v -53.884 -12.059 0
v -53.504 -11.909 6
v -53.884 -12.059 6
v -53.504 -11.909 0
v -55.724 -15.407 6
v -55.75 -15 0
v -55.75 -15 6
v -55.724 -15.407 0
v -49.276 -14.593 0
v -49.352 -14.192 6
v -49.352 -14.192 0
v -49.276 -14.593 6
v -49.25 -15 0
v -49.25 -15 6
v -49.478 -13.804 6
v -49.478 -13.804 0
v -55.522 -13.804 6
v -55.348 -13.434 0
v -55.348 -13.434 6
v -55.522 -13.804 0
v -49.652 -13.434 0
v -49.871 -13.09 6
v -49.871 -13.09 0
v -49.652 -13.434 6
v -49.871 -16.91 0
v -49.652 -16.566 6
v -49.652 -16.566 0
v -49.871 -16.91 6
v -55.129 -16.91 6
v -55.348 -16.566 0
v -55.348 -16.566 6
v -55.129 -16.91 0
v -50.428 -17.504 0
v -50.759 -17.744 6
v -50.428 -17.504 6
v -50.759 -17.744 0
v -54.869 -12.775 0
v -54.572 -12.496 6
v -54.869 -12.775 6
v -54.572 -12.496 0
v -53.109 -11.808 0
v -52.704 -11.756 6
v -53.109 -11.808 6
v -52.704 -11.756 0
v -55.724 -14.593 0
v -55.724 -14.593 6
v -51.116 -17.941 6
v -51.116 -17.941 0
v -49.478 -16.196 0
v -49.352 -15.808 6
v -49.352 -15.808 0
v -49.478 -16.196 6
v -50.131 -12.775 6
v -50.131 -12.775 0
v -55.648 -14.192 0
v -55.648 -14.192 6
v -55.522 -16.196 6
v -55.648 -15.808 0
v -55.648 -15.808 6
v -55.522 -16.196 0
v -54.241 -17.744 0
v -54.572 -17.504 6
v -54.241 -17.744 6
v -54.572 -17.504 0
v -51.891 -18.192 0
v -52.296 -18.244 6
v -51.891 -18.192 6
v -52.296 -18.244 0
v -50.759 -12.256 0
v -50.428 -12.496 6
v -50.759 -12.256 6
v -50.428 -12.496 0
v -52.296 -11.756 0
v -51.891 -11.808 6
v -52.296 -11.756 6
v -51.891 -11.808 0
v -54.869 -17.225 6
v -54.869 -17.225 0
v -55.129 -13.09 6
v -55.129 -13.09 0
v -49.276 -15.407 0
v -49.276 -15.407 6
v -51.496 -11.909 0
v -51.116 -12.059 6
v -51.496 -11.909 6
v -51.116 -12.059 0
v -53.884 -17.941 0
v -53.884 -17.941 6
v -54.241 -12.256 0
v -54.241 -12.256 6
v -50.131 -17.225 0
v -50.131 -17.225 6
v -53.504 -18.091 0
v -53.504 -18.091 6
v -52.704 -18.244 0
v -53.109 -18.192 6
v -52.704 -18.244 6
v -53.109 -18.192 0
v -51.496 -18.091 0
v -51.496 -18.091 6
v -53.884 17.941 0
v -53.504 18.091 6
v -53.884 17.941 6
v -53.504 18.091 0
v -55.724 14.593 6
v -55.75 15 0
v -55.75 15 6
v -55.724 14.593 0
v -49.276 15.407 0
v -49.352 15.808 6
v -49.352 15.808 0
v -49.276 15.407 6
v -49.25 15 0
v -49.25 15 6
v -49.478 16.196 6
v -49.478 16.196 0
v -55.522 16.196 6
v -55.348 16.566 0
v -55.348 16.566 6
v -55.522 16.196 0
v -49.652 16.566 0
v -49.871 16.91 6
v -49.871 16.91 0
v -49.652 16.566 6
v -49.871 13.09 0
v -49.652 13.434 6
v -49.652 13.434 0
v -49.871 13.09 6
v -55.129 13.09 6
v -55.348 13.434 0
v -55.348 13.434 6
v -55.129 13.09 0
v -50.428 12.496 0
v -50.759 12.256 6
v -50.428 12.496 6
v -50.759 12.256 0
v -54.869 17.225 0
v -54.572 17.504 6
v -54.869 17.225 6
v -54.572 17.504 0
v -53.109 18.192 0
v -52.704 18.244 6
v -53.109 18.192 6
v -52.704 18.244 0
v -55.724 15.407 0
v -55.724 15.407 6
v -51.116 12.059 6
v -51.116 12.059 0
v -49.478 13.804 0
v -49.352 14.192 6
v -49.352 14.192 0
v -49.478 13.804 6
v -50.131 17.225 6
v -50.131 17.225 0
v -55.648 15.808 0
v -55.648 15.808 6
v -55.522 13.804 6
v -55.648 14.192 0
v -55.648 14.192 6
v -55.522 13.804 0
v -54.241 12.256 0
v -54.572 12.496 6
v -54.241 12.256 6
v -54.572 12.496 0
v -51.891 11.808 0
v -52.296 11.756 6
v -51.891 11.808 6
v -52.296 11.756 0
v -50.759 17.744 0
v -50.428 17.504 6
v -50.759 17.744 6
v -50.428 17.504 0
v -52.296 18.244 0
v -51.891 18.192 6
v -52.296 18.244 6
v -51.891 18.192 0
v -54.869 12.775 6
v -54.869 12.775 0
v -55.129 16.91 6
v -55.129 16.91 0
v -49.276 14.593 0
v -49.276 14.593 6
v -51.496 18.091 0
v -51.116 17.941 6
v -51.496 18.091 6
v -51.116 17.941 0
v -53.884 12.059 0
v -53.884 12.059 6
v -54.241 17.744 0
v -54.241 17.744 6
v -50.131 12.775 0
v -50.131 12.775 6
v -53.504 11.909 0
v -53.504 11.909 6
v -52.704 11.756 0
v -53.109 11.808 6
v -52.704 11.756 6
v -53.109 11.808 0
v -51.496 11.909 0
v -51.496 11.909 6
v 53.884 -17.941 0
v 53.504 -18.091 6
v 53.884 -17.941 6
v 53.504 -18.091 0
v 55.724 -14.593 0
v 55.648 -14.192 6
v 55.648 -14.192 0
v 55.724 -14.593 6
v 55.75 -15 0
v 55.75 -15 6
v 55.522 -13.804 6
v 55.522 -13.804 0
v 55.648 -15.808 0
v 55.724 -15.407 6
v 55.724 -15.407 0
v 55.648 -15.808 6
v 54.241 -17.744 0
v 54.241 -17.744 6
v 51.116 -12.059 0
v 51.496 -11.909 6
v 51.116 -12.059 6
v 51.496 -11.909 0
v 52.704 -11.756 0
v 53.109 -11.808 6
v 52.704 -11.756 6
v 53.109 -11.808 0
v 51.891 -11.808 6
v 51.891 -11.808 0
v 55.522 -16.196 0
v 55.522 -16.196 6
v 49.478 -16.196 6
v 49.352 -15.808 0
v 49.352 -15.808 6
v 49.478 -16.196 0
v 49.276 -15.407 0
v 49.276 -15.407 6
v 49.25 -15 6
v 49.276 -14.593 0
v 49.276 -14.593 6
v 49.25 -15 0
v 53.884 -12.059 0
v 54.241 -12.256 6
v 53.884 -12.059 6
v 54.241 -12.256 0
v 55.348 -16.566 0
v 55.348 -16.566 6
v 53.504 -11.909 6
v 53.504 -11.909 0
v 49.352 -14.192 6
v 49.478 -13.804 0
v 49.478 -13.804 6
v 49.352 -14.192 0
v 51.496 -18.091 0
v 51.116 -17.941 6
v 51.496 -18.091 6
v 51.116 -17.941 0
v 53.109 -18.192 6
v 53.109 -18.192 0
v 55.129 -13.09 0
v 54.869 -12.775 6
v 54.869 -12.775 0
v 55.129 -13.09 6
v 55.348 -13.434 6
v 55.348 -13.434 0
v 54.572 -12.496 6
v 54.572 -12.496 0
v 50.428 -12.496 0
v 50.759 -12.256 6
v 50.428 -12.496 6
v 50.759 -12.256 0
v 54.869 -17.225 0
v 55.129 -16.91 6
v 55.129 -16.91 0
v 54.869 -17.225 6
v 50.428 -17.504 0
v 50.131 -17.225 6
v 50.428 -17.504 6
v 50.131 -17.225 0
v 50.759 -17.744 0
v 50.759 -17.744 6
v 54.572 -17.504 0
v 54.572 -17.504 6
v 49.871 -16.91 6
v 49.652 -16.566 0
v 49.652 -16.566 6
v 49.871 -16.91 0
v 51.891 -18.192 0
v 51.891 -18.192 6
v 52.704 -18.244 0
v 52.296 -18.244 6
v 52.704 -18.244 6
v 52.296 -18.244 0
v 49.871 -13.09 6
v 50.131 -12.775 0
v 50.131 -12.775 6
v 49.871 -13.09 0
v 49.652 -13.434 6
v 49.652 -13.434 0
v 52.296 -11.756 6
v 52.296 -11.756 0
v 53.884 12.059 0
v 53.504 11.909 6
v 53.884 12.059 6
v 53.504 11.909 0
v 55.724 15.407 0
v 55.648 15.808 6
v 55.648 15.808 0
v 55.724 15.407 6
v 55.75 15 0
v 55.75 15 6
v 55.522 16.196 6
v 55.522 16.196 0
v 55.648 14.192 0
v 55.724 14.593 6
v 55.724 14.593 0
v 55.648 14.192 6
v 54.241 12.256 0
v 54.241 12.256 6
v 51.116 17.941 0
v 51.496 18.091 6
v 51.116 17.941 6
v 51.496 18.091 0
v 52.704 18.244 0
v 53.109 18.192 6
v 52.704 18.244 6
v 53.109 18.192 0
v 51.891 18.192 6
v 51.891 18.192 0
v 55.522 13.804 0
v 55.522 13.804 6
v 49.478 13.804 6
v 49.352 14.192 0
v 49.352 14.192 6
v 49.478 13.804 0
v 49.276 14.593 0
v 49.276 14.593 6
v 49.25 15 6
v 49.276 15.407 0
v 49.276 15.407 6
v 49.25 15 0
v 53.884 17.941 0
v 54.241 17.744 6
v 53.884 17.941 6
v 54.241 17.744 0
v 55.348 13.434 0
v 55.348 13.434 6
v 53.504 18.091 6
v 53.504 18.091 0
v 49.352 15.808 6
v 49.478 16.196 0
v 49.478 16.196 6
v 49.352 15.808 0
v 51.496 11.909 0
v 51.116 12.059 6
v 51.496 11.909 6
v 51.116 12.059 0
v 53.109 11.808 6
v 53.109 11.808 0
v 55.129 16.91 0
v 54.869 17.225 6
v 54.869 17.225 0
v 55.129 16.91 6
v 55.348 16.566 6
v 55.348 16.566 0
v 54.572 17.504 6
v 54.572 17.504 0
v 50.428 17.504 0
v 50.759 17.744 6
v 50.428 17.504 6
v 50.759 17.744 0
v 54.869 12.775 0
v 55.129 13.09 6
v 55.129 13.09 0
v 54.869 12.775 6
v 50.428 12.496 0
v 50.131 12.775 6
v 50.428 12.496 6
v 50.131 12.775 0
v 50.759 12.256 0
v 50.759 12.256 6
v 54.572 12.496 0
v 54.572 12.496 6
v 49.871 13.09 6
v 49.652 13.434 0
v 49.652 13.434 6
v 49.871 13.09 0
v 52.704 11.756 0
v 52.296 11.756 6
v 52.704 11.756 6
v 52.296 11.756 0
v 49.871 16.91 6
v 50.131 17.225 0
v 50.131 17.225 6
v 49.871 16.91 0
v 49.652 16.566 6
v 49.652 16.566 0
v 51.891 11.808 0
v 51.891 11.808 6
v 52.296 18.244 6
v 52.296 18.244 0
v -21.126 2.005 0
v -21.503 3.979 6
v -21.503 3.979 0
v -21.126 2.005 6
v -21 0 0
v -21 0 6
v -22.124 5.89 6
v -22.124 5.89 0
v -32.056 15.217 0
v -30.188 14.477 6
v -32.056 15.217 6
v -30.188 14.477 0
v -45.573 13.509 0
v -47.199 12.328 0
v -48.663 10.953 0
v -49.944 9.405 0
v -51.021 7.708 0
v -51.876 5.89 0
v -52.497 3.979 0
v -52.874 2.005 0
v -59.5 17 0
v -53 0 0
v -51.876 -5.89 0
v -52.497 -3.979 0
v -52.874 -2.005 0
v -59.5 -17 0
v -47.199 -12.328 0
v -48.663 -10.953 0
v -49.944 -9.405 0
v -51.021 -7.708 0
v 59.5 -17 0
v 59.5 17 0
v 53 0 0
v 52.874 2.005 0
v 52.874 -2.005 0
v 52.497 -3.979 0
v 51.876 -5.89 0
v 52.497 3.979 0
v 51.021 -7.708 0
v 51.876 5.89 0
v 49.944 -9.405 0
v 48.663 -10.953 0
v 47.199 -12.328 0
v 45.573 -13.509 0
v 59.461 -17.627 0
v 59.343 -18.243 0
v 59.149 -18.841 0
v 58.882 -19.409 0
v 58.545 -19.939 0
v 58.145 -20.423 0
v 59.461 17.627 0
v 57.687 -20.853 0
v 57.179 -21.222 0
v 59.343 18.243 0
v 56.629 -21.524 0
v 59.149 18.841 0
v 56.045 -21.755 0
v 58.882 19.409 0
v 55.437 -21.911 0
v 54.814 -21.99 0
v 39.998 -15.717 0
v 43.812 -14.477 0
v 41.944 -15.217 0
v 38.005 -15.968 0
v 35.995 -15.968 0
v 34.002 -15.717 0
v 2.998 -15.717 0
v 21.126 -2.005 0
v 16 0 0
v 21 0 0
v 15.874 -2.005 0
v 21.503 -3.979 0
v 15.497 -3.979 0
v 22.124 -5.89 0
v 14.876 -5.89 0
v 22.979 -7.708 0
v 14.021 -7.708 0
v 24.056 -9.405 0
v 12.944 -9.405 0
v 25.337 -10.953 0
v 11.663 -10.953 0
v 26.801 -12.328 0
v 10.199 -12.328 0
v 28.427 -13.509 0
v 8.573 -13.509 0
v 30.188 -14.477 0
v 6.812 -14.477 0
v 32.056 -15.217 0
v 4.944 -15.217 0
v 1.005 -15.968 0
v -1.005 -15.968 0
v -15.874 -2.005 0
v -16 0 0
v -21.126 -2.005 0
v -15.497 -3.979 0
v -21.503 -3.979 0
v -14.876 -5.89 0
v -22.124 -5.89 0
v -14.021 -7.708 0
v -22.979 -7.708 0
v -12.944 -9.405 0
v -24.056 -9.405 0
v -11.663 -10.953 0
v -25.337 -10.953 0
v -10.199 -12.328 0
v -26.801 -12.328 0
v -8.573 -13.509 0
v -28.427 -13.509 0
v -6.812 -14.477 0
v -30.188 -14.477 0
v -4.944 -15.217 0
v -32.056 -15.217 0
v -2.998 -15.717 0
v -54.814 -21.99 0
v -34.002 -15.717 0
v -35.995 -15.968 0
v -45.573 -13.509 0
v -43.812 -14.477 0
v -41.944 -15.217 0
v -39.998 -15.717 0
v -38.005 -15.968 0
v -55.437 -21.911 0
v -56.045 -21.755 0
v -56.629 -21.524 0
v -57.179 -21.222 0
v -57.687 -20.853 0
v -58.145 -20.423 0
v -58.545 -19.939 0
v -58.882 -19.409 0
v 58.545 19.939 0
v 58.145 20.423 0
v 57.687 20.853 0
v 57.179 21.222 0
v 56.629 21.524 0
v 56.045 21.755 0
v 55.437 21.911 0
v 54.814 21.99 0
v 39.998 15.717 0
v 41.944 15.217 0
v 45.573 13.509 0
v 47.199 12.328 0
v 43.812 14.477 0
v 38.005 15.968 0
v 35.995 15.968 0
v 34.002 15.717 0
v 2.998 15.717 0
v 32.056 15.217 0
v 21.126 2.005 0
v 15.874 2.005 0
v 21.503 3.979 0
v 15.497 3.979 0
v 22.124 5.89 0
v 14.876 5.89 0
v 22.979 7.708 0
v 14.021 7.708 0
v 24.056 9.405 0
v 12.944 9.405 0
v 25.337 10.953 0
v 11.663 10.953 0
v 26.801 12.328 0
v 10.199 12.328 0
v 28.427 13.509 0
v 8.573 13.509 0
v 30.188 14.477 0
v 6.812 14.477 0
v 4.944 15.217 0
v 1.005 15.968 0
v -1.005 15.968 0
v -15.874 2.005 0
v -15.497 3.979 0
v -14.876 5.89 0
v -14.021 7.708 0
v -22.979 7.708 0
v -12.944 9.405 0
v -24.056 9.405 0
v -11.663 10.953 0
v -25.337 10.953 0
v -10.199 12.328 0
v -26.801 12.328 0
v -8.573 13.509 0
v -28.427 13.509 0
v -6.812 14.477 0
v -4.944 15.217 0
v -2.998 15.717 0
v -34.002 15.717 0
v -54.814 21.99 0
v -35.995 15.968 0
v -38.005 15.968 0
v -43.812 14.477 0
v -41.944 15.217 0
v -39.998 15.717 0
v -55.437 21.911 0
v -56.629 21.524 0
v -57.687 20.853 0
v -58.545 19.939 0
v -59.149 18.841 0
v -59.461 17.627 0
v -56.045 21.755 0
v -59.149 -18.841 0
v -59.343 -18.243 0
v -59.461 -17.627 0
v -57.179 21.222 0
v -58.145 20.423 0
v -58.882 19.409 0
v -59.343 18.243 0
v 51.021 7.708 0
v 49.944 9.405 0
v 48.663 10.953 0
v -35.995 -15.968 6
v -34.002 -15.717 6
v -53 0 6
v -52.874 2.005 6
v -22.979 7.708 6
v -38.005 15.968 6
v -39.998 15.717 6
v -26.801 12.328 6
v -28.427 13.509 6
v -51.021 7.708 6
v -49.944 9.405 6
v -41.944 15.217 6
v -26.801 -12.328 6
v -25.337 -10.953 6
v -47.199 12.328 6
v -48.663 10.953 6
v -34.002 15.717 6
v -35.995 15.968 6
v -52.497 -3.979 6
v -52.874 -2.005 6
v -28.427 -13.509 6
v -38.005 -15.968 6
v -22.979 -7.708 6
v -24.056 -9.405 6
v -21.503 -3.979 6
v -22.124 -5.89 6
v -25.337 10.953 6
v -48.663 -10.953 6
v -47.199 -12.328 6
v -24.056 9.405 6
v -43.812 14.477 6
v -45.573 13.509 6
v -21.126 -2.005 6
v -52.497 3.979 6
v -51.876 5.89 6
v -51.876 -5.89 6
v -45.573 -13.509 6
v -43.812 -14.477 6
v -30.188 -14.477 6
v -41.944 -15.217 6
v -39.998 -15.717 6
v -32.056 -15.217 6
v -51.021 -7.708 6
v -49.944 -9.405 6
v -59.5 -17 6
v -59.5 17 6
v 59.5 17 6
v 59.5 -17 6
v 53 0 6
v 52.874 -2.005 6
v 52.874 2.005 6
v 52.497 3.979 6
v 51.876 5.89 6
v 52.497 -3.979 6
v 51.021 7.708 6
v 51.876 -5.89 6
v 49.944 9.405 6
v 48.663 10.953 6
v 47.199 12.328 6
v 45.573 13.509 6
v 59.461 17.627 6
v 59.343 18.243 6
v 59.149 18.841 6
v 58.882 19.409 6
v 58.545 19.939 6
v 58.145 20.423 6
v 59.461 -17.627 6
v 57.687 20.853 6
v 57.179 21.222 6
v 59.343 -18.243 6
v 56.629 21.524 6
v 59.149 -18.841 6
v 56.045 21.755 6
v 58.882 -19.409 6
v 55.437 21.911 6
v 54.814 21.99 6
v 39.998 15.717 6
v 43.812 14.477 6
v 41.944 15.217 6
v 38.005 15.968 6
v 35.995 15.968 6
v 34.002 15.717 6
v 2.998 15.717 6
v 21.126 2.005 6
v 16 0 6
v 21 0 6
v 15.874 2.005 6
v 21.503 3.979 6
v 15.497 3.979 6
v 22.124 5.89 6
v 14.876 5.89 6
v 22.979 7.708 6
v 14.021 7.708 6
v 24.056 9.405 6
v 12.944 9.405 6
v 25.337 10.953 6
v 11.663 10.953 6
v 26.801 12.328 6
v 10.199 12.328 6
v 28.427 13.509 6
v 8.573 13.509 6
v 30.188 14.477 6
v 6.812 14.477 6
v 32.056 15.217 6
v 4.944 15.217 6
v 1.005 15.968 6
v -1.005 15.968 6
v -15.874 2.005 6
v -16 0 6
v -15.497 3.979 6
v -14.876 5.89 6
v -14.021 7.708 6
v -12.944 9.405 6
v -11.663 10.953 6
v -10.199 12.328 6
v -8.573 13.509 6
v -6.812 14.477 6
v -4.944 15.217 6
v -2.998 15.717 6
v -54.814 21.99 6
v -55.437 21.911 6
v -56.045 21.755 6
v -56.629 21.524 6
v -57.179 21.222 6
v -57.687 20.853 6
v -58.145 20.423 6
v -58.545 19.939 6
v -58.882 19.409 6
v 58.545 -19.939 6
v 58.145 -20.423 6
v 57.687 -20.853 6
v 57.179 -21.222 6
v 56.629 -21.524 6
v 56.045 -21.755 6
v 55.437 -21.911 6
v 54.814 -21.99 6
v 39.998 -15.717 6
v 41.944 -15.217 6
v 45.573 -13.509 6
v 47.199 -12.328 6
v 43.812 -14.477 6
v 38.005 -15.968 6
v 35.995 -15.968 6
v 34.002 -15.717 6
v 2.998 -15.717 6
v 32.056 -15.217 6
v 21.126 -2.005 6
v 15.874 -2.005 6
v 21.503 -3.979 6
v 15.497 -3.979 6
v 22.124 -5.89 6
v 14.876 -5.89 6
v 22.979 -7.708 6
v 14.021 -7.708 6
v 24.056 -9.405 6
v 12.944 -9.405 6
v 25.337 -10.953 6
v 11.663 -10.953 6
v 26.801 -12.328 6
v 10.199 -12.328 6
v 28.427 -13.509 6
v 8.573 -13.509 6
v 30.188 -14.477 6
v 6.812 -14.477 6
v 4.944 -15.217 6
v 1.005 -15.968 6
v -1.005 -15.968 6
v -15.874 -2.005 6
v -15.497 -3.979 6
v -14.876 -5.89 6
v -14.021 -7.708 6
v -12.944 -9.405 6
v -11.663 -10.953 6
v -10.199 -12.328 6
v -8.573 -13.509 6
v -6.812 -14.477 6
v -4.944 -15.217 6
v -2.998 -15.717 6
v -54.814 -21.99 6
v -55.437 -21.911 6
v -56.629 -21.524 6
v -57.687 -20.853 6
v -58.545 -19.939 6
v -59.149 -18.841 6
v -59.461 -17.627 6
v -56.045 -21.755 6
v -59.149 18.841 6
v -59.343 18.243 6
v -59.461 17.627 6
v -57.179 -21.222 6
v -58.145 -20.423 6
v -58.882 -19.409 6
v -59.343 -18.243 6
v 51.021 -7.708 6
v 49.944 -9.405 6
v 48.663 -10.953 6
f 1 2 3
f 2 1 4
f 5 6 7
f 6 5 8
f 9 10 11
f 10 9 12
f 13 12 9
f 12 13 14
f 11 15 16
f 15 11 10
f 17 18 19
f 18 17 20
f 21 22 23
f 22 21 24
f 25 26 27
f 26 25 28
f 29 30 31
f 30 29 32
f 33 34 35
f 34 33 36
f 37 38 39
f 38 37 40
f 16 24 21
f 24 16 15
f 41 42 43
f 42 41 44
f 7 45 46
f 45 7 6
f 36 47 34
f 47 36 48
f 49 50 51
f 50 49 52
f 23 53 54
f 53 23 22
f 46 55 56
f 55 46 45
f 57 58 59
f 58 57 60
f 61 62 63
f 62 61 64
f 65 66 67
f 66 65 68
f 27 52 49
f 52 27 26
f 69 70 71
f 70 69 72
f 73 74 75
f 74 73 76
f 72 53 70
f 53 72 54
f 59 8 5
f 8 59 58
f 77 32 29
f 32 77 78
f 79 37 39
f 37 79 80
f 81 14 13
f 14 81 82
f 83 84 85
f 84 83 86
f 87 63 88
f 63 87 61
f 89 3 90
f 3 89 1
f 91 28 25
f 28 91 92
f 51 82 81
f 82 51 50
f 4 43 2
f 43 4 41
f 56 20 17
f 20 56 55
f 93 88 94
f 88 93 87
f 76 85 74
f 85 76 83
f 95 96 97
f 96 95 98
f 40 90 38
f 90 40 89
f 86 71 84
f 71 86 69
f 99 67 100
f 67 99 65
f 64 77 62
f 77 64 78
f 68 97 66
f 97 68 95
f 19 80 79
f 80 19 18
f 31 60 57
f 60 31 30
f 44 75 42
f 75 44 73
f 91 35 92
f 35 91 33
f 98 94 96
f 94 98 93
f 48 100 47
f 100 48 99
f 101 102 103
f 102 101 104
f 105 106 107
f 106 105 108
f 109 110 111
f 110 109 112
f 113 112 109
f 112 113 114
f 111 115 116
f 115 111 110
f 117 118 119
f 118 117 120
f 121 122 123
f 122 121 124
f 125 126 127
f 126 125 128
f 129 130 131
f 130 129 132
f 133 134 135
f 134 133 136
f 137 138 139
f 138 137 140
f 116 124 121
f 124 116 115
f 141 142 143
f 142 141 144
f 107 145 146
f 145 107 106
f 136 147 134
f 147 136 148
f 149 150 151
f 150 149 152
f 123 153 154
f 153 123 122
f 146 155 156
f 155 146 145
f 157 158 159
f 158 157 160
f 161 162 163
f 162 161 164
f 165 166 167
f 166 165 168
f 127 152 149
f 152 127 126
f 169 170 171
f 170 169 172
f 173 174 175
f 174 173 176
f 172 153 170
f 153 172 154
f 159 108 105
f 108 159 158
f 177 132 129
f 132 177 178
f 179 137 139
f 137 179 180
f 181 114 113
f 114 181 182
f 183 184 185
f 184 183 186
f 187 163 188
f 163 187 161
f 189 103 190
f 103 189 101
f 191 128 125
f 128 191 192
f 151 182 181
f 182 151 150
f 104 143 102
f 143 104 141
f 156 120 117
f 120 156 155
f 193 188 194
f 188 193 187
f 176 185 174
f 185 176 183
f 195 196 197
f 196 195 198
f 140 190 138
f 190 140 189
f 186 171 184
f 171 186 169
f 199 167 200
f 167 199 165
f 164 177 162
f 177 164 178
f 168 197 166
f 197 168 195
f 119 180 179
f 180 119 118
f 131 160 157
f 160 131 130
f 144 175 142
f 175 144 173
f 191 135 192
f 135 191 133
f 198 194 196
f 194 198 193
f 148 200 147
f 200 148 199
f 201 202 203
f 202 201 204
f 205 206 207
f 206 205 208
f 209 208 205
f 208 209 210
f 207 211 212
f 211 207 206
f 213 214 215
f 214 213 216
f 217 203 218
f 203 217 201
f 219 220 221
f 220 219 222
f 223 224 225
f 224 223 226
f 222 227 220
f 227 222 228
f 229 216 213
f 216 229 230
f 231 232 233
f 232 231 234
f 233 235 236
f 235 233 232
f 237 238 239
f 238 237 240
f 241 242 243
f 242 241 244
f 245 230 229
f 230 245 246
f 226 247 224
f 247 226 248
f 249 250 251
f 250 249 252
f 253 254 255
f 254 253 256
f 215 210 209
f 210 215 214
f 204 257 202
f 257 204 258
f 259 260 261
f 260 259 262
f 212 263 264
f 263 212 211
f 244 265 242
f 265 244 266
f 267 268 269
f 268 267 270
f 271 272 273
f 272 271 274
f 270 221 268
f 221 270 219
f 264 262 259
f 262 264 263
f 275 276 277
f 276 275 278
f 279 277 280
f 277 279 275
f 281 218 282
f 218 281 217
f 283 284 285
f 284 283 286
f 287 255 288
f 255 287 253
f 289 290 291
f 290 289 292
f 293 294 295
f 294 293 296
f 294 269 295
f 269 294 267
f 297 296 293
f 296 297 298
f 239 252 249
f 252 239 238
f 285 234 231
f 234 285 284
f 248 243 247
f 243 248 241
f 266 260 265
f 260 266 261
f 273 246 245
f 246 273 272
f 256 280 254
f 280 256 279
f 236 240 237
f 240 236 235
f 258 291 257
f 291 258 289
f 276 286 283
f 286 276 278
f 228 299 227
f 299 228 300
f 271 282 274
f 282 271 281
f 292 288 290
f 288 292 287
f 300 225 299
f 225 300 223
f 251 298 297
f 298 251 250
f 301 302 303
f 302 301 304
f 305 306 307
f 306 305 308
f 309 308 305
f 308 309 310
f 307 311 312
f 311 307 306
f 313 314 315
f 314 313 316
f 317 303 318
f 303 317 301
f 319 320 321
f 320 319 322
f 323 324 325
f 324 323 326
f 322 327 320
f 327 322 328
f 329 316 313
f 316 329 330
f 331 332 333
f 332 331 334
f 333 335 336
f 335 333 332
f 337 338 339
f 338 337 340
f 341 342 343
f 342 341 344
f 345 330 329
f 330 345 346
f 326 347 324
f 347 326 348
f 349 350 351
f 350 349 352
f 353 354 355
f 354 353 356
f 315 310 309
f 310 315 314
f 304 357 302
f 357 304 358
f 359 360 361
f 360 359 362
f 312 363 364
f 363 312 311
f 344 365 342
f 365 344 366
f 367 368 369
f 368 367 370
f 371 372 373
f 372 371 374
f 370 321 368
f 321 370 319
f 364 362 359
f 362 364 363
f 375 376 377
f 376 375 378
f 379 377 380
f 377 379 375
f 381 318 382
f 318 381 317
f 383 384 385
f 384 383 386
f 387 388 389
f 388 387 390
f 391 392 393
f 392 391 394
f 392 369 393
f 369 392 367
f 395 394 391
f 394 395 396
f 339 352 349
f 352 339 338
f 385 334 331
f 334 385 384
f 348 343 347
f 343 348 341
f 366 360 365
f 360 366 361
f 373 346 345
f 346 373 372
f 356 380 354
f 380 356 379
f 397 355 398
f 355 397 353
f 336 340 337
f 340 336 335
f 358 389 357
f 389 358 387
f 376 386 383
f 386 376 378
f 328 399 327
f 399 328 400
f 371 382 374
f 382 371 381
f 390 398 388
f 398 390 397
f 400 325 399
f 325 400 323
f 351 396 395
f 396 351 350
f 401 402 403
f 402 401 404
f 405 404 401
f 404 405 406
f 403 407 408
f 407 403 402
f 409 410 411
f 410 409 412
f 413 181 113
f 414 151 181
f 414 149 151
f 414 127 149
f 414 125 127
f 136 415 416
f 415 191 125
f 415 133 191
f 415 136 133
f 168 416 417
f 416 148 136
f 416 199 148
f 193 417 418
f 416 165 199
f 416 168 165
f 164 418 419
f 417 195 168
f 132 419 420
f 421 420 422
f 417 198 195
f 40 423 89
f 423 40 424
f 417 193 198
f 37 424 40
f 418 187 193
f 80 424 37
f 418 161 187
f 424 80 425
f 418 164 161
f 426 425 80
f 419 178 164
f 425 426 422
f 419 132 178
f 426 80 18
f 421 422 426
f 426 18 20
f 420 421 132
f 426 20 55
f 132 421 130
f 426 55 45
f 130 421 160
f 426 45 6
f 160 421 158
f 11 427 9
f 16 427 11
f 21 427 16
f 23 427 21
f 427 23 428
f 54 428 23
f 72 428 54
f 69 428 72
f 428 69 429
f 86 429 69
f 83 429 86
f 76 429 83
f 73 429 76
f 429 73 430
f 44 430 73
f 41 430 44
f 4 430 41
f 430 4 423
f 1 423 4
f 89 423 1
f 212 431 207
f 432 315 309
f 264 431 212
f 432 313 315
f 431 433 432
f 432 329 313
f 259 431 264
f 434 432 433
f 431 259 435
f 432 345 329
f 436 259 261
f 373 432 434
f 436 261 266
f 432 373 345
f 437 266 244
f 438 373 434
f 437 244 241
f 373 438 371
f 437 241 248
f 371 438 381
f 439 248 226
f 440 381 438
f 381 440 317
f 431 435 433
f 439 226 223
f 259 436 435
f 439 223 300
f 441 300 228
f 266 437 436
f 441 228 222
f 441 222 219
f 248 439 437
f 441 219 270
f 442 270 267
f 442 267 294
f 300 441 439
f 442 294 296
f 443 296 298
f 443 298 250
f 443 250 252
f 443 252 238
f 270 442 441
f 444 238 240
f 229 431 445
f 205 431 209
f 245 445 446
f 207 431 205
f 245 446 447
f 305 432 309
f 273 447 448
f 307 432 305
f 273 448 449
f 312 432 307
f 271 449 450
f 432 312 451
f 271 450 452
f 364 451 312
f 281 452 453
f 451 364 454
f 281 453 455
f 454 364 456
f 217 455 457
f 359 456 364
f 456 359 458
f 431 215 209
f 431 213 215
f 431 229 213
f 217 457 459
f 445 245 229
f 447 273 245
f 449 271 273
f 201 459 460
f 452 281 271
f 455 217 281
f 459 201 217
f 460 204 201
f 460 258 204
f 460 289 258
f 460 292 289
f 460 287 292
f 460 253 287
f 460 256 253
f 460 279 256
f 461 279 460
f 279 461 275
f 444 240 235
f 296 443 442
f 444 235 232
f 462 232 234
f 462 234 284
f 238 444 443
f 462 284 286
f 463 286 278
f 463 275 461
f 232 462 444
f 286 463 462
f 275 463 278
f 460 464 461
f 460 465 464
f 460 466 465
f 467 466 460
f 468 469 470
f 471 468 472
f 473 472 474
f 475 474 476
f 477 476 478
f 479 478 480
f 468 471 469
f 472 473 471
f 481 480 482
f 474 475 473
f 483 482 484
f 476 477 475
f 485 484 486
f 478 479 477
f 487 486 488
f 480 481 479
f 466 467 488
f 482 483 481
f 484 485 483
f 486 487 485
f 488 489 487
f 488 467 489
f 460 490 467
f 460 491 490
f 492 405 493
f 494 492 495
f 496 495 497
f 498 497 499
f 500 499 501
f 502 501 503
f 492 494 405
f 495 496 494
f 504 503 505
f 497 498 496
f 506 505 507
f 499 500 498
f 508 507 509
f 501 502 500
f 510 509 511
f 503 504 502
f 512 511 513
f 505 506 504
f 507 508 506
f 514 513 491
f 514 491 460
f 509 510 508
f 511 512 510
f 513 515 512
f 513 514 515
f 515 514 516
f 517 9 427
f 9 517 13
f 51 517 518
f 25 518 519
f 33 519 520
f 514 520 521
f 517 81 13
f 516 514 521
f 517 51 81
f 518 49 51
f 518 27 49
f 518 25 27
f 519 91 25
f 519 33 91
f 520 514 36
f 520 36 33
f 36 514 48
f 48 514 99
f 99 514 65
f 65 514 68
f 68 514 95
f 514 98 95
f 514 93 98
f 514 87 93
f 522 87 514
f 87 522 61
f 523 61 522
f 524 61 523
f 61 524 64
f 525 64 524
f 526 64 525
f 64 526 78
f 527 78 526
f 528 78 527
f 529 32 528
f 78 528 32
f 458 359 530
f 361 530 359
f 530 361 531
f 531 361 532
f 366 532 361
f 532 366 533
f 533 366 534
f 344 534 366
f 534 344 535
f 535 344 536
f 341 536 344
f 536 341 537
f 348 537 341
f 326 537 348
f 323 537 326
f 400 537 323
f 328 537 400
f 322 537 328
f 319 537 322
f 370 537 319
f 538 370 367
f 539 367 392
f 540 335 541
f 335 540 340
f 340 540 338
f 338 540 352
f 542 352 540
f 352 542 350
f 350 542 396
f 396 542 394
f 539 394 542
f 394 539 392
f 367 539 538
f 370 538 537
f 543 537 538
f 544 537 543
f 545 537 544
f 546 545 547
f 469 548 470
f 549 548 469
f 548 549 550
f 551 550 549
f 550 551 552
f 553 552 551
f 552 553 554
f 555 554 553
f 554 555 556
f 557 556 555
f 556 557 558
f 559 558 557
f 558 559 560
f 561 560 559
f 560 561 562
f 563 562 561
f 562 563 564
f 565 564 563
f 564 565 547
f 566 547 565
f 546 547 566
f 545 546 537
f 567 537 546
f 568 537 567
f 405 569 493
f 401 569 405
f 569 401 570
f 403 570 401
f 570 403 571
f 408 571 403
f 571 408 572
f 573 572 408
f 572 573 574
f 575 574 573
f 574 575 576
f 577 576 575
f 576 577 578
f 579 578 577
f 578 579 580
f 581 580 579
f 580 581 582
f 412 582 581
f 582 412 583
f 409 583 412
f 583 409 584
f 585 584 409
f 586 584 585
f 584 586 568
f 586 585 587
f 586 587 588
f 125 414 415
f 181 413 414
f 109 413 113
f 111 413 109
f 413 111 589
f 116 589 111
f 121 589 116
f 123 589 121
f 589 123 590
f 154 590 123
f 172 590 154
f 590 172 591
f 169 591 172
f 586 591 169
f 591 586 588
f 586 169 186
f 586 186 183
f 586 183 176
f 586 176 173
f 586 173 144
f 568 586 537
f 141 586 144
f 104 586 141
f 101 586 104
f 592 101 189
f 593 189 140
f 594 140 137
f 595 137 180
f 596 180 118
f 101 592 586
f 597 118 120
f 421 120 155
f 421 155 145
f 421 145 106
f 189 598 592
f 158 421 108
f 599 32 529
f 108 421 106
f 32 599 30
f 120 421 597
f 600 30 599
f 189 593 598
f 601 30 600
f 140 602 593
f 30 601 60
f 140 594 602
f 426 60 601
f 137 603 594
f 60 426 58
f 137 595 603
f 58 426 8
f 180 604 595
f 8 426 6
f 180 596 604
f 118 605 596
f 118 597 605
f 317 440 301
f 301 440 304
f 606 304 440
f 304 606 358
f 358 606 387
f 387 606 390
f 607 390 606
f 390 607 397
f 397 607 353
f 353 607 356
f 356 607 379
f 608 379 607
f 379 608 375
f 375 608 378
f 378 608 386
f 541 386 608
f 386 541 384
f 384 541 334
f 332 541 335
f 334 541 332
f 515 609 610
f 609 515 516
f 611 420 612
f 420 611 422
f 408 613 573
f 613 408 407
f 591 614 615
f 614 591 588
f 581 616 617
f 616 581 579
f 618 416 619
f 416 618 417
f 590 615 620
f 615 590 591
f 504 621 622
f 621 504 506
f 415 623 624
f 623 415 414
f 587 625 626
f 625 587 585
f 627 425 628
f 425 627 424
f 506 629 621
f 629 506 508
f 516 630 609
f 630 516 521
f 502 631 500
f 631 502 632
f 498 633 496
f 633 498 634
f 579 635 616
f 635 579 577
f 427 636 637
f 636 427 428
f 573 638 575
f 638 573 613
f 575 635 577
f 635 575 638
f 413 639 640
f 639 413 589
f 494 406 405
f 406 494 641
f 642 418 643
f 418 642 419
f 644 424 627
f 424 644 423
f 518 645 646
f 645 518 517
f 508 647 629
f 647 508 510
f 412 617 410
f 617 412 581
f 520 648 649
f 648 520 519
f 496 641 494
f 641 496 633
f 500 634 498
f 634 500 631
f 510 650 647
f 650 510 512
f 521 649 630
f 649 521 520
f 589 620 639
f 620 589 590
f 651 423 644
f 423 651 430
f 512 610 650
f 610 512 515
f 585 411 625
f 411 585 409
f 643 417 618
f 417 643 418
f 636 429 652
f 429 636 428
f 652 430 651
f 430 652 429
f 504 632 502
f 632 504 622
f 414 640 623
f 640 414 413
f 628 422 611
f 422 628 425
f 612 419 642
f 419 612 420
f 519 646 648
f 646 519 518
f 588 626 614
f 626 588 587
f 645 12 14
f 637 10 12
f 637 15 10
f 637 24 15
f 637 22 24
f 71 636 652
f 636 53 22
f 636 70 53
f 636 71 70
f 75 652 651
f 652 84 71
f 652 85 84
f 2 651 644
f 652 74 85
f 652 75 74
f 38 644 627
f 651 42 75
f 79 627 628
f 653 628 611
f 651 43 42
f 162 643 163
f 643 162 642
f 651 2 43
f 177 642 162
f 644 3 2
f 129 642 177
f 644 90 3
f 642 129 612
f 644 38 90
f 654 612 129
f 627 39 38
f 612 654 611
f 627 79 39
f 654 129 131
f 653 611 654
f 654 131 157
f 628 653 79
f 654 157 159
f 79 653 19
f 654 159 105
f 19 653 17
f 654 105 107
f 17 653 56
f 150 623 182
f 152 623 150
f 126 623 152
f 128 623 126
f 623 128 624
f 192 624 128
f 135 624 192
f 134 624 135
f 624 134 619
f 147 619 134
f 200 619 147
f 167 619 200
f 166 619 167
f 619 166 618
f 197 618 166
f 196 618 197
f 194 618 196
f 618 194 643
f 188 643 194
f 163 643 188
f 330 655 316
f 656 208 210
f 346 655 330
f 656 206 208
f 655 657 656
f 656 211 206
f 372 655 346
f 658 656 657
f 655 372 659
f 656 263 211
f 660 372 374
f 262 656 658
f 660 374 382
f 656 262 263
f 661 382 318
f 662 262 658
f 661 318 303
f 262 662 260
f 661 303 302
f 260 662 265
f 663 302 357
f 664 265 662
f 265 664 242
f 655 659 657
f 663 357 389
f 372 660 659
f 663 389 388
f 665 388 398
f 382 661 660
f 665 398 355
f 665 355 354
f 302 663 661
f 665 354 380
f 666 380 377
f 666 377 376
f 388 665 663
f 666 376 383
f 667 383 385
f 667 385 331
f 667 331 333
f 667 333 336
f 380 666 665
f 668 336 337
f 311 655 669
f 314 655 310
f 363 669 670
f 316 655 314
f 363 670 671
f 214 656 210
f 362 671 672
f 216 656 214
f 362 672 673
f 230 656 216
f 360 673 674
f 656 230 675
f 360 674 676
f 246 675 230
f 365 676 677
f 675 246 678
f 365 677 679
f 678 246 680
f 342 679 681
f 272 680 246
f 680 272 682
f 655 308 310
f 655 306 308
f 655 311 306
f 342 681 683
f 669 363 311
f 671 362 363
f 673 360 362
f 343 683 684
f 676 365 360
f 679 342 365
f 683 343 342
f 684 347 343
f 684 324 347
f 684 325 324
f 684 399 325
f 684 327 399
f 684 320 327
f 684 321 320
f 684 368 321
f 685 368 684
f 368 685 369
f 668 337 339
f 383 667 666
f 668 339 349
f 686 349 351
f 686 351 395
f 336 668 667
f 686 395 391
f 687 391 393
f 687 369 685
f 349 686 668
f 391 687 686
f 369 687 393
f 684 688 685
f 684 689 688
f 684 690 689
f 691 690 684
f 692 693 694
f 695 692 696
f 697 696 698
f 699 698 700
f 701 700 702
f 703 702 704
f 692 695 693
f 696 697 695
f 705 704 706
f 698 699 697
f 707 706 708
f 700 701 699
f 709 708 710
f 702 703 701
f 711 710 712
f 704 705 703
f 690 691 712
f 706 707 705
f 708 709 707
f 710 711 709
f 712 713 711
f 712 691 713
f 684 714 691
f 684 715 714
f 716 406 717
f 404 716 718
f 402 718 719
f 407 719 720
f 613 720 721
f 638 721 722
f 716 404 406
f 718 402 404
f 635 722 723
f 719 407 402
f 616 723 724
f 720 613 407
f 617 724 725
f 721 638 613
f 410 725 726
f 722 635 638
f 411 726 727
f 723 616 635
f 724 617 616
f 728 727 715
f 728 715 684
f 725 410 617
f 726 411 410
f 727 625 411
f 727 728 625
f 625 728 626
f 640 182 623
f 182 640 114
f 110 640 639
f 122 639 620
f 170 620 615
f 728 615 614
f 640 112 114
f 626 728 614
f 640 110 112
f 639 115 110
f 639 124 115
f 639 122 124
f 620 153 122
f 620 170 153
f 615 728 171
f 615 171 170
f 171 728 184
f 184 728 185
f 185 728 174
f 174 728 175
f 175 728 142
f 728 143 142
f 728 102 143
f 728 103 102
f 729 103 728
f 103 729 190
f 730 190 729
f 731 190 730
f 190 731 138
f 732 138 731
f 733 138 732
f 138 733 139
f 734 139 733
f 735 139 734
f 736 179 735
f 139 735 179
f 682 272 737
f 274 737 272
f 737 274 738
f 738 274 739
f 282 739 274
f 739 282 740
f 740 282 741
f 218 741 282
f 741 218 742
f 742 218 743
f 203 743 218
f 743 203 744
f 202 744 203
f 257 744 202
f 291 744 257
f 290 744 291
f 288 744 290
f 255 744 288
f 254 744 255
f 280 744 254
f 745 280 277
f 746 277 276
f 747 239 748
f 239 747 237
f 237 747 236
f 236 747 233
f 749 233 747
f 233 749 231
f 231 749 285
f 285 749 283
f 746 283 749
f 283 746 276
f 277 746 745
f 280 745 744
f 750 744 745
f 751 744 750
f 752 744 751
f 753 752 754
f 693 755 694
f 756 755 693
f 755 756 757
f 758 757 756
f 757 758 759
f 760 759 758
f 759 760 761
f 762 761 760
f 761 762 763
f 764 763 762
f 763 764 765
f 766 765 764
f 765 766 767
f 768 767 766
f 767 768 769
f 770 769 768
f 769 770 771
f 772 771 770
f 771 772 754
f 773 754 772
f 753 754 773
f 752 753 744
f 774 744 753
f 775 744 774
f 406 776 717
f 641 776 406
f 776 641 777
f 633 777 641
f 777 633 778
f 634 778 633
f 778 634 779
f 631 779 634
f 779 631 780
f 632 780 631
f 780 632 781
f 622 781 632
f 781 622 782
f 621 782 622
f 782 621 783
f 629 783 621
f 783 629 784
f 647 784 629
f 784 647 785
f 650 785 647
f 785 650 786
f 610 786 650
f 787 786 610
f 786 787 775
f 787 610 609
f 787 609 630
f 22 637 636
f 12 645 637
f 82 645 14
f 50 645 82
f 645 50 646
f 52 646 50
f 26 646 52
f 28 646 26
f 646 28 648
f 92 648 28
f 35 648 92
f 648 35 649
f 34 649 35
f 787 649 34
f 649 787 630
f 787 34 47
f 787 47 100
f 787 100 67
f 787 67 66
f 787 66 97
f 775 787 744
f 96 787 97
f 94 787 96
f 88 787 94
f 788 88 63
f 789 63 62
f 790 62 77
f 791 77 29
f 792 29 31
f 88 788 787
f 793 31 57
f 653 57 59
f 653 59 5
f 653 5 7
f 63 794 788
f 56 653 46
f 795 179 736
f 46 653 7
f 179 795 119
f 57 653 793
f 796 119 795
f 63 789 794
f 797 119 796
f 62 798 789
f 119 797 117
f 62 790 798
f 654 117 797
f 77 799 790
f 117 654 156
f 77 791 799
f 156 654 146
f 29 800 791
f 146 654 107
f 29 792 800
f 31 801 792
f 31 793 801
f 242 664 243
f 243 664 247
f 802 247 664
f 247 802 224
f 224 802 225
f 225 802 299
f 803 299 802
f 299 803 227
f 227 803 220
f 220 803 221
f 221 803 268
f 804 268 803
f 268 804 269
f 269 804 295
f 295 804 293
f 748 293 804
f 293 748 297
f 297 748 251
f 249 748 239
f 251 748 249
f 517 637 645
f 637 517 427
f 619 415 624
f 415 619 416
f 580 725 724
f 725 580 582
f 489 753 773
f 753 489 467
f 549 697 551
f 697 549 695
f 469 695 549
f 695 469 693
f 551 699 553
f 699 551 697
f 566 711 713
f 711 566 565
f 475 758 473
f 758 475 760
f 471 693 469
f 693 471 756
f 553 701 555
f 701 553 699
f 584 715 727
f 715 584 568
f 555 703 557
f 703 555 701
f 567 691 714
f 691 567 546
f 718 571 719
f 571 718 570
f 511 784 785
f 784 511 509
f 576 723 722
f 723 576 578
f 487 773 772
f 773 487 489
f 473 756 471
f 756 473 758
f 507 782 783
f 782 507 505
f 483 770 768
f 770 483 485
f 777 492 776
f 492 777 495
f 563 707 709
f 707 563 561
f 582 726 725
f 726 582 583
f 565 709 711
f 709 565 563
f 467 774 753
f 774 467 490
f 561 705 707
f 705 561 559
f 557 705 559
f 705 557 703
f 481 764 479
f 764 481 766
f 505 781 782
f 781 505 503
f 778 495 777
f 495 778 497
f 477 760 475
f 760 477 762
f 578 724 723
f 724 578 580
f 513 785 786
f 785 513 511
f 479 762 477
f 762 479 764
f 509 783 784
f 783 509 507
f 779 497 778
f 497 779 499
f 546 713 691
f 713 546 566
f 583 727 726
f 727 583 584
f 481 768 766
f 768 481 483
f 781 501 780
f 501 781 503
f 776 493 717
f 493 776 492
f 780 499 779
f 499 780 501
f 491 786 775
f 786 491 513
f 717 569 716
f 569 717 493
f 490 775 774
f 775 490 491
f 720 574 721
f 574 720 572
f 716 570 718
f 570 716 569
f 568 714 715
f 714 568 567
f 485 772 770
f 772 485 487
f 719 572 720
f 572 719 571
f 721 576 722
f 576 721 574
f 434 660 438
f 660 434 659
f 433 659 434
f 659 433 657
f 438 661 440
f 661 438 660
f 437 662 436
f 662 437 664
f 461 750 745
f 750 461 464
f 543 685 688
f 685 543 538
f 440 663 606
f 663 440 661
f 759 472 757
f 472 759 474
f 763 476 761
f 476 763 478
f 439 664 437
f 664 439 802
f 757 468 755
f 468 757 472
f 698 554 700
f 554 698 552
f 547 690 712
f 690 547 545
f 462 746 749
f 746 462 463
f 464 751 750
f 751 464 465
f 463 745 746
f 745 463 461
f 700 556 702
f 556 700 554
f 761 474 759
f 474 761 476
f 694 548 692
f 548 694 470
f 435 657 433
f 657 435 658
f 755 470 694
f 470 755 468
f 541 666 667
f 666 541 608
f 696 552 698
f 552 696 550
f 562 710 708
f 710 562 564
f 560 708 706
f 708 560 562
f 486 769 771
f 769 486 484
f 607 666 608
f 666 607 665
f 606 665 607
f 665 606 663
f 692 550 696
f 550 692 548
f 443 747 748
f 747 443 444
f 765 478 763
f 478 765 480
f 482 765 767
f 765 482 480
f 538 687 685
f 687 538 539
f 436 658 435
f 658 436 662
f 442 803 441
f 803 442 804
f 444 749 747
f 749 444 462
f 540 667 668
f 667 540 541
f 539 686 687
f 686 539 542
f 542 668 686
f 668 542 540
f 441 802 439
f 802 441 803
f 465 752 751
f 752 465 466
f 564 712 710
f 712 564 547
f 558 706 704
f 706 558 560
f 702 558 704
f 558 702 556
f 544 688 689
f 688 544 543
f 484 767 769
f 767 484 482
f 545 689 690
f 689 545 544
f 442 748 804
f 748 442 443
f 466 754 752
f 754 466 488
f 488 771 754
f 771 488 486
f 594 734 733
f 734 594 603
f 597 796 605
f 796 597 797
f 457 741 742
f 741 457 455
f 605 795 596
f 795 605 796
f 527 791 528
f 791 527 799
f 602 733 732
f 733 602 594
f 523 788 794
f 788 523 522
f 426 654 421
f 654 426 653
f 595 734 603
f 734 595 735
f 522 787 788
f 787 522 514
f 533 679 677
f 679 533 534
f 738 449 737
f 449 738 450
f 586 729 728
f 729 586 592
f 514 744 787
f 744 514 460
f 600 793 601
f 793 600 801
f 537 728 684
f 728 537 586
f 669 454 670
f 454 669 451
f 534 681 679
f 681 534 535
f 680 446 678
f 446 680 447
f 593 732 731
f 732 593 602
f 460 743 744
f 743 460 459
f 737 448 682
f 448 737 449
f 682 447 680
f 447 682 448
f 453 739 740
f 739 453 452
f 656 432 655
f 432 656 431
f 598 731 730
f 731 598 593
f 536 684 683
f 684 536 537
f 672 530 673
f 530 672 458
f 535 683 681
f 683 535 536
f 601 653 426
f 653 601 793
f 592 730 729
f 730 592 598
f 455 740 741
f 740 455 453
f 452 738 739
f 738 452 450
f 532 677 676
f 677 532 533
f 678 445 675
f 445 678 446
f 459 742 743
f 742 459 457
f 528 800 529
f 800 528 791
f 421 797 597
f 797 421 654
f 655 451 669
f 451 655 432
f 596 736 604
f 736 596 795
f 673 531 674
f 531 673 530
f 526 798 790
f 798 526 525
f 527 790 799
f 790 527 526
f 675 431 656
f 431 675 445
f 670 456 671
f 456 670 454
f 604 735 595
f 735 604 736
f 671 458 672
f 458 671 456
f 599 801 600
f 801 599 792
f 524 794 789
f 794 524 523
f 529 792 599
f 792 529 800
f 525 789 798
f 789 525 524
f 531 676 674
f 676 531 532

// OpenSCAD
$fn = 50;

difference() {
	union() {
		hull() {
			translate(v = [-54.5, 17.0, 0]) {
				cylinder(h = 6, r = 5);
			}
			translate(v = [54.5, 17.0, 0]) {
				cylinder(h = 6, r = 5);
			}
			translate(v = [-54.5, -17.0, 0]) {
				cylinder(h = 6, r = 5);
			}
			translate(v = [54.5, -17.0, 0]) {
				cylinder(h = 6, r = 5);
			}
		}
	}
	union() {
		translate(v = [-52.5, -15.0, -100.0]) {
			cylinder(h = 200, r = 3.25);
		}
		translate(v = [-52.5, 15.0, -100.0]) {
			cylinder(h = 200, r = 3.25);
		}
		translate(v = [52.5, -15.0, -100.0]) {
			cylinder(h = 200, r = 3.25);
		}
		translate(v = [52.5, 15.0, -100.0]) {
			cylinder(h = 200, r = 3.25);
		}
		translate(v = [-52.5, -15.0, -100.0]) {
			cylinder(h = 200, r = 1.8);
		}
		translate(v = [-52.5, 15.0, -100.0]) {
			cylinder(h = 200, r = 1.8);
		}
		translate(v = [52.5, -15.0, -100.0]) {
			cylinder(h = 200, r = 1.8);
		}
		translate(v = [52.5, 15.0, -100.0]) {
			cylinder(h = 200, r = 1.8);
		}
		translate(v = [-37.0, 0, 0.0]) {
			cylinder(h = 6, r = 16.0);
		}
		cylinder(h = 6, r = 16.0);
		translate(v = [37.0, 0, 0.0]) {
			cylinder(h = 6, r = 16.0);
		}
	}
}
